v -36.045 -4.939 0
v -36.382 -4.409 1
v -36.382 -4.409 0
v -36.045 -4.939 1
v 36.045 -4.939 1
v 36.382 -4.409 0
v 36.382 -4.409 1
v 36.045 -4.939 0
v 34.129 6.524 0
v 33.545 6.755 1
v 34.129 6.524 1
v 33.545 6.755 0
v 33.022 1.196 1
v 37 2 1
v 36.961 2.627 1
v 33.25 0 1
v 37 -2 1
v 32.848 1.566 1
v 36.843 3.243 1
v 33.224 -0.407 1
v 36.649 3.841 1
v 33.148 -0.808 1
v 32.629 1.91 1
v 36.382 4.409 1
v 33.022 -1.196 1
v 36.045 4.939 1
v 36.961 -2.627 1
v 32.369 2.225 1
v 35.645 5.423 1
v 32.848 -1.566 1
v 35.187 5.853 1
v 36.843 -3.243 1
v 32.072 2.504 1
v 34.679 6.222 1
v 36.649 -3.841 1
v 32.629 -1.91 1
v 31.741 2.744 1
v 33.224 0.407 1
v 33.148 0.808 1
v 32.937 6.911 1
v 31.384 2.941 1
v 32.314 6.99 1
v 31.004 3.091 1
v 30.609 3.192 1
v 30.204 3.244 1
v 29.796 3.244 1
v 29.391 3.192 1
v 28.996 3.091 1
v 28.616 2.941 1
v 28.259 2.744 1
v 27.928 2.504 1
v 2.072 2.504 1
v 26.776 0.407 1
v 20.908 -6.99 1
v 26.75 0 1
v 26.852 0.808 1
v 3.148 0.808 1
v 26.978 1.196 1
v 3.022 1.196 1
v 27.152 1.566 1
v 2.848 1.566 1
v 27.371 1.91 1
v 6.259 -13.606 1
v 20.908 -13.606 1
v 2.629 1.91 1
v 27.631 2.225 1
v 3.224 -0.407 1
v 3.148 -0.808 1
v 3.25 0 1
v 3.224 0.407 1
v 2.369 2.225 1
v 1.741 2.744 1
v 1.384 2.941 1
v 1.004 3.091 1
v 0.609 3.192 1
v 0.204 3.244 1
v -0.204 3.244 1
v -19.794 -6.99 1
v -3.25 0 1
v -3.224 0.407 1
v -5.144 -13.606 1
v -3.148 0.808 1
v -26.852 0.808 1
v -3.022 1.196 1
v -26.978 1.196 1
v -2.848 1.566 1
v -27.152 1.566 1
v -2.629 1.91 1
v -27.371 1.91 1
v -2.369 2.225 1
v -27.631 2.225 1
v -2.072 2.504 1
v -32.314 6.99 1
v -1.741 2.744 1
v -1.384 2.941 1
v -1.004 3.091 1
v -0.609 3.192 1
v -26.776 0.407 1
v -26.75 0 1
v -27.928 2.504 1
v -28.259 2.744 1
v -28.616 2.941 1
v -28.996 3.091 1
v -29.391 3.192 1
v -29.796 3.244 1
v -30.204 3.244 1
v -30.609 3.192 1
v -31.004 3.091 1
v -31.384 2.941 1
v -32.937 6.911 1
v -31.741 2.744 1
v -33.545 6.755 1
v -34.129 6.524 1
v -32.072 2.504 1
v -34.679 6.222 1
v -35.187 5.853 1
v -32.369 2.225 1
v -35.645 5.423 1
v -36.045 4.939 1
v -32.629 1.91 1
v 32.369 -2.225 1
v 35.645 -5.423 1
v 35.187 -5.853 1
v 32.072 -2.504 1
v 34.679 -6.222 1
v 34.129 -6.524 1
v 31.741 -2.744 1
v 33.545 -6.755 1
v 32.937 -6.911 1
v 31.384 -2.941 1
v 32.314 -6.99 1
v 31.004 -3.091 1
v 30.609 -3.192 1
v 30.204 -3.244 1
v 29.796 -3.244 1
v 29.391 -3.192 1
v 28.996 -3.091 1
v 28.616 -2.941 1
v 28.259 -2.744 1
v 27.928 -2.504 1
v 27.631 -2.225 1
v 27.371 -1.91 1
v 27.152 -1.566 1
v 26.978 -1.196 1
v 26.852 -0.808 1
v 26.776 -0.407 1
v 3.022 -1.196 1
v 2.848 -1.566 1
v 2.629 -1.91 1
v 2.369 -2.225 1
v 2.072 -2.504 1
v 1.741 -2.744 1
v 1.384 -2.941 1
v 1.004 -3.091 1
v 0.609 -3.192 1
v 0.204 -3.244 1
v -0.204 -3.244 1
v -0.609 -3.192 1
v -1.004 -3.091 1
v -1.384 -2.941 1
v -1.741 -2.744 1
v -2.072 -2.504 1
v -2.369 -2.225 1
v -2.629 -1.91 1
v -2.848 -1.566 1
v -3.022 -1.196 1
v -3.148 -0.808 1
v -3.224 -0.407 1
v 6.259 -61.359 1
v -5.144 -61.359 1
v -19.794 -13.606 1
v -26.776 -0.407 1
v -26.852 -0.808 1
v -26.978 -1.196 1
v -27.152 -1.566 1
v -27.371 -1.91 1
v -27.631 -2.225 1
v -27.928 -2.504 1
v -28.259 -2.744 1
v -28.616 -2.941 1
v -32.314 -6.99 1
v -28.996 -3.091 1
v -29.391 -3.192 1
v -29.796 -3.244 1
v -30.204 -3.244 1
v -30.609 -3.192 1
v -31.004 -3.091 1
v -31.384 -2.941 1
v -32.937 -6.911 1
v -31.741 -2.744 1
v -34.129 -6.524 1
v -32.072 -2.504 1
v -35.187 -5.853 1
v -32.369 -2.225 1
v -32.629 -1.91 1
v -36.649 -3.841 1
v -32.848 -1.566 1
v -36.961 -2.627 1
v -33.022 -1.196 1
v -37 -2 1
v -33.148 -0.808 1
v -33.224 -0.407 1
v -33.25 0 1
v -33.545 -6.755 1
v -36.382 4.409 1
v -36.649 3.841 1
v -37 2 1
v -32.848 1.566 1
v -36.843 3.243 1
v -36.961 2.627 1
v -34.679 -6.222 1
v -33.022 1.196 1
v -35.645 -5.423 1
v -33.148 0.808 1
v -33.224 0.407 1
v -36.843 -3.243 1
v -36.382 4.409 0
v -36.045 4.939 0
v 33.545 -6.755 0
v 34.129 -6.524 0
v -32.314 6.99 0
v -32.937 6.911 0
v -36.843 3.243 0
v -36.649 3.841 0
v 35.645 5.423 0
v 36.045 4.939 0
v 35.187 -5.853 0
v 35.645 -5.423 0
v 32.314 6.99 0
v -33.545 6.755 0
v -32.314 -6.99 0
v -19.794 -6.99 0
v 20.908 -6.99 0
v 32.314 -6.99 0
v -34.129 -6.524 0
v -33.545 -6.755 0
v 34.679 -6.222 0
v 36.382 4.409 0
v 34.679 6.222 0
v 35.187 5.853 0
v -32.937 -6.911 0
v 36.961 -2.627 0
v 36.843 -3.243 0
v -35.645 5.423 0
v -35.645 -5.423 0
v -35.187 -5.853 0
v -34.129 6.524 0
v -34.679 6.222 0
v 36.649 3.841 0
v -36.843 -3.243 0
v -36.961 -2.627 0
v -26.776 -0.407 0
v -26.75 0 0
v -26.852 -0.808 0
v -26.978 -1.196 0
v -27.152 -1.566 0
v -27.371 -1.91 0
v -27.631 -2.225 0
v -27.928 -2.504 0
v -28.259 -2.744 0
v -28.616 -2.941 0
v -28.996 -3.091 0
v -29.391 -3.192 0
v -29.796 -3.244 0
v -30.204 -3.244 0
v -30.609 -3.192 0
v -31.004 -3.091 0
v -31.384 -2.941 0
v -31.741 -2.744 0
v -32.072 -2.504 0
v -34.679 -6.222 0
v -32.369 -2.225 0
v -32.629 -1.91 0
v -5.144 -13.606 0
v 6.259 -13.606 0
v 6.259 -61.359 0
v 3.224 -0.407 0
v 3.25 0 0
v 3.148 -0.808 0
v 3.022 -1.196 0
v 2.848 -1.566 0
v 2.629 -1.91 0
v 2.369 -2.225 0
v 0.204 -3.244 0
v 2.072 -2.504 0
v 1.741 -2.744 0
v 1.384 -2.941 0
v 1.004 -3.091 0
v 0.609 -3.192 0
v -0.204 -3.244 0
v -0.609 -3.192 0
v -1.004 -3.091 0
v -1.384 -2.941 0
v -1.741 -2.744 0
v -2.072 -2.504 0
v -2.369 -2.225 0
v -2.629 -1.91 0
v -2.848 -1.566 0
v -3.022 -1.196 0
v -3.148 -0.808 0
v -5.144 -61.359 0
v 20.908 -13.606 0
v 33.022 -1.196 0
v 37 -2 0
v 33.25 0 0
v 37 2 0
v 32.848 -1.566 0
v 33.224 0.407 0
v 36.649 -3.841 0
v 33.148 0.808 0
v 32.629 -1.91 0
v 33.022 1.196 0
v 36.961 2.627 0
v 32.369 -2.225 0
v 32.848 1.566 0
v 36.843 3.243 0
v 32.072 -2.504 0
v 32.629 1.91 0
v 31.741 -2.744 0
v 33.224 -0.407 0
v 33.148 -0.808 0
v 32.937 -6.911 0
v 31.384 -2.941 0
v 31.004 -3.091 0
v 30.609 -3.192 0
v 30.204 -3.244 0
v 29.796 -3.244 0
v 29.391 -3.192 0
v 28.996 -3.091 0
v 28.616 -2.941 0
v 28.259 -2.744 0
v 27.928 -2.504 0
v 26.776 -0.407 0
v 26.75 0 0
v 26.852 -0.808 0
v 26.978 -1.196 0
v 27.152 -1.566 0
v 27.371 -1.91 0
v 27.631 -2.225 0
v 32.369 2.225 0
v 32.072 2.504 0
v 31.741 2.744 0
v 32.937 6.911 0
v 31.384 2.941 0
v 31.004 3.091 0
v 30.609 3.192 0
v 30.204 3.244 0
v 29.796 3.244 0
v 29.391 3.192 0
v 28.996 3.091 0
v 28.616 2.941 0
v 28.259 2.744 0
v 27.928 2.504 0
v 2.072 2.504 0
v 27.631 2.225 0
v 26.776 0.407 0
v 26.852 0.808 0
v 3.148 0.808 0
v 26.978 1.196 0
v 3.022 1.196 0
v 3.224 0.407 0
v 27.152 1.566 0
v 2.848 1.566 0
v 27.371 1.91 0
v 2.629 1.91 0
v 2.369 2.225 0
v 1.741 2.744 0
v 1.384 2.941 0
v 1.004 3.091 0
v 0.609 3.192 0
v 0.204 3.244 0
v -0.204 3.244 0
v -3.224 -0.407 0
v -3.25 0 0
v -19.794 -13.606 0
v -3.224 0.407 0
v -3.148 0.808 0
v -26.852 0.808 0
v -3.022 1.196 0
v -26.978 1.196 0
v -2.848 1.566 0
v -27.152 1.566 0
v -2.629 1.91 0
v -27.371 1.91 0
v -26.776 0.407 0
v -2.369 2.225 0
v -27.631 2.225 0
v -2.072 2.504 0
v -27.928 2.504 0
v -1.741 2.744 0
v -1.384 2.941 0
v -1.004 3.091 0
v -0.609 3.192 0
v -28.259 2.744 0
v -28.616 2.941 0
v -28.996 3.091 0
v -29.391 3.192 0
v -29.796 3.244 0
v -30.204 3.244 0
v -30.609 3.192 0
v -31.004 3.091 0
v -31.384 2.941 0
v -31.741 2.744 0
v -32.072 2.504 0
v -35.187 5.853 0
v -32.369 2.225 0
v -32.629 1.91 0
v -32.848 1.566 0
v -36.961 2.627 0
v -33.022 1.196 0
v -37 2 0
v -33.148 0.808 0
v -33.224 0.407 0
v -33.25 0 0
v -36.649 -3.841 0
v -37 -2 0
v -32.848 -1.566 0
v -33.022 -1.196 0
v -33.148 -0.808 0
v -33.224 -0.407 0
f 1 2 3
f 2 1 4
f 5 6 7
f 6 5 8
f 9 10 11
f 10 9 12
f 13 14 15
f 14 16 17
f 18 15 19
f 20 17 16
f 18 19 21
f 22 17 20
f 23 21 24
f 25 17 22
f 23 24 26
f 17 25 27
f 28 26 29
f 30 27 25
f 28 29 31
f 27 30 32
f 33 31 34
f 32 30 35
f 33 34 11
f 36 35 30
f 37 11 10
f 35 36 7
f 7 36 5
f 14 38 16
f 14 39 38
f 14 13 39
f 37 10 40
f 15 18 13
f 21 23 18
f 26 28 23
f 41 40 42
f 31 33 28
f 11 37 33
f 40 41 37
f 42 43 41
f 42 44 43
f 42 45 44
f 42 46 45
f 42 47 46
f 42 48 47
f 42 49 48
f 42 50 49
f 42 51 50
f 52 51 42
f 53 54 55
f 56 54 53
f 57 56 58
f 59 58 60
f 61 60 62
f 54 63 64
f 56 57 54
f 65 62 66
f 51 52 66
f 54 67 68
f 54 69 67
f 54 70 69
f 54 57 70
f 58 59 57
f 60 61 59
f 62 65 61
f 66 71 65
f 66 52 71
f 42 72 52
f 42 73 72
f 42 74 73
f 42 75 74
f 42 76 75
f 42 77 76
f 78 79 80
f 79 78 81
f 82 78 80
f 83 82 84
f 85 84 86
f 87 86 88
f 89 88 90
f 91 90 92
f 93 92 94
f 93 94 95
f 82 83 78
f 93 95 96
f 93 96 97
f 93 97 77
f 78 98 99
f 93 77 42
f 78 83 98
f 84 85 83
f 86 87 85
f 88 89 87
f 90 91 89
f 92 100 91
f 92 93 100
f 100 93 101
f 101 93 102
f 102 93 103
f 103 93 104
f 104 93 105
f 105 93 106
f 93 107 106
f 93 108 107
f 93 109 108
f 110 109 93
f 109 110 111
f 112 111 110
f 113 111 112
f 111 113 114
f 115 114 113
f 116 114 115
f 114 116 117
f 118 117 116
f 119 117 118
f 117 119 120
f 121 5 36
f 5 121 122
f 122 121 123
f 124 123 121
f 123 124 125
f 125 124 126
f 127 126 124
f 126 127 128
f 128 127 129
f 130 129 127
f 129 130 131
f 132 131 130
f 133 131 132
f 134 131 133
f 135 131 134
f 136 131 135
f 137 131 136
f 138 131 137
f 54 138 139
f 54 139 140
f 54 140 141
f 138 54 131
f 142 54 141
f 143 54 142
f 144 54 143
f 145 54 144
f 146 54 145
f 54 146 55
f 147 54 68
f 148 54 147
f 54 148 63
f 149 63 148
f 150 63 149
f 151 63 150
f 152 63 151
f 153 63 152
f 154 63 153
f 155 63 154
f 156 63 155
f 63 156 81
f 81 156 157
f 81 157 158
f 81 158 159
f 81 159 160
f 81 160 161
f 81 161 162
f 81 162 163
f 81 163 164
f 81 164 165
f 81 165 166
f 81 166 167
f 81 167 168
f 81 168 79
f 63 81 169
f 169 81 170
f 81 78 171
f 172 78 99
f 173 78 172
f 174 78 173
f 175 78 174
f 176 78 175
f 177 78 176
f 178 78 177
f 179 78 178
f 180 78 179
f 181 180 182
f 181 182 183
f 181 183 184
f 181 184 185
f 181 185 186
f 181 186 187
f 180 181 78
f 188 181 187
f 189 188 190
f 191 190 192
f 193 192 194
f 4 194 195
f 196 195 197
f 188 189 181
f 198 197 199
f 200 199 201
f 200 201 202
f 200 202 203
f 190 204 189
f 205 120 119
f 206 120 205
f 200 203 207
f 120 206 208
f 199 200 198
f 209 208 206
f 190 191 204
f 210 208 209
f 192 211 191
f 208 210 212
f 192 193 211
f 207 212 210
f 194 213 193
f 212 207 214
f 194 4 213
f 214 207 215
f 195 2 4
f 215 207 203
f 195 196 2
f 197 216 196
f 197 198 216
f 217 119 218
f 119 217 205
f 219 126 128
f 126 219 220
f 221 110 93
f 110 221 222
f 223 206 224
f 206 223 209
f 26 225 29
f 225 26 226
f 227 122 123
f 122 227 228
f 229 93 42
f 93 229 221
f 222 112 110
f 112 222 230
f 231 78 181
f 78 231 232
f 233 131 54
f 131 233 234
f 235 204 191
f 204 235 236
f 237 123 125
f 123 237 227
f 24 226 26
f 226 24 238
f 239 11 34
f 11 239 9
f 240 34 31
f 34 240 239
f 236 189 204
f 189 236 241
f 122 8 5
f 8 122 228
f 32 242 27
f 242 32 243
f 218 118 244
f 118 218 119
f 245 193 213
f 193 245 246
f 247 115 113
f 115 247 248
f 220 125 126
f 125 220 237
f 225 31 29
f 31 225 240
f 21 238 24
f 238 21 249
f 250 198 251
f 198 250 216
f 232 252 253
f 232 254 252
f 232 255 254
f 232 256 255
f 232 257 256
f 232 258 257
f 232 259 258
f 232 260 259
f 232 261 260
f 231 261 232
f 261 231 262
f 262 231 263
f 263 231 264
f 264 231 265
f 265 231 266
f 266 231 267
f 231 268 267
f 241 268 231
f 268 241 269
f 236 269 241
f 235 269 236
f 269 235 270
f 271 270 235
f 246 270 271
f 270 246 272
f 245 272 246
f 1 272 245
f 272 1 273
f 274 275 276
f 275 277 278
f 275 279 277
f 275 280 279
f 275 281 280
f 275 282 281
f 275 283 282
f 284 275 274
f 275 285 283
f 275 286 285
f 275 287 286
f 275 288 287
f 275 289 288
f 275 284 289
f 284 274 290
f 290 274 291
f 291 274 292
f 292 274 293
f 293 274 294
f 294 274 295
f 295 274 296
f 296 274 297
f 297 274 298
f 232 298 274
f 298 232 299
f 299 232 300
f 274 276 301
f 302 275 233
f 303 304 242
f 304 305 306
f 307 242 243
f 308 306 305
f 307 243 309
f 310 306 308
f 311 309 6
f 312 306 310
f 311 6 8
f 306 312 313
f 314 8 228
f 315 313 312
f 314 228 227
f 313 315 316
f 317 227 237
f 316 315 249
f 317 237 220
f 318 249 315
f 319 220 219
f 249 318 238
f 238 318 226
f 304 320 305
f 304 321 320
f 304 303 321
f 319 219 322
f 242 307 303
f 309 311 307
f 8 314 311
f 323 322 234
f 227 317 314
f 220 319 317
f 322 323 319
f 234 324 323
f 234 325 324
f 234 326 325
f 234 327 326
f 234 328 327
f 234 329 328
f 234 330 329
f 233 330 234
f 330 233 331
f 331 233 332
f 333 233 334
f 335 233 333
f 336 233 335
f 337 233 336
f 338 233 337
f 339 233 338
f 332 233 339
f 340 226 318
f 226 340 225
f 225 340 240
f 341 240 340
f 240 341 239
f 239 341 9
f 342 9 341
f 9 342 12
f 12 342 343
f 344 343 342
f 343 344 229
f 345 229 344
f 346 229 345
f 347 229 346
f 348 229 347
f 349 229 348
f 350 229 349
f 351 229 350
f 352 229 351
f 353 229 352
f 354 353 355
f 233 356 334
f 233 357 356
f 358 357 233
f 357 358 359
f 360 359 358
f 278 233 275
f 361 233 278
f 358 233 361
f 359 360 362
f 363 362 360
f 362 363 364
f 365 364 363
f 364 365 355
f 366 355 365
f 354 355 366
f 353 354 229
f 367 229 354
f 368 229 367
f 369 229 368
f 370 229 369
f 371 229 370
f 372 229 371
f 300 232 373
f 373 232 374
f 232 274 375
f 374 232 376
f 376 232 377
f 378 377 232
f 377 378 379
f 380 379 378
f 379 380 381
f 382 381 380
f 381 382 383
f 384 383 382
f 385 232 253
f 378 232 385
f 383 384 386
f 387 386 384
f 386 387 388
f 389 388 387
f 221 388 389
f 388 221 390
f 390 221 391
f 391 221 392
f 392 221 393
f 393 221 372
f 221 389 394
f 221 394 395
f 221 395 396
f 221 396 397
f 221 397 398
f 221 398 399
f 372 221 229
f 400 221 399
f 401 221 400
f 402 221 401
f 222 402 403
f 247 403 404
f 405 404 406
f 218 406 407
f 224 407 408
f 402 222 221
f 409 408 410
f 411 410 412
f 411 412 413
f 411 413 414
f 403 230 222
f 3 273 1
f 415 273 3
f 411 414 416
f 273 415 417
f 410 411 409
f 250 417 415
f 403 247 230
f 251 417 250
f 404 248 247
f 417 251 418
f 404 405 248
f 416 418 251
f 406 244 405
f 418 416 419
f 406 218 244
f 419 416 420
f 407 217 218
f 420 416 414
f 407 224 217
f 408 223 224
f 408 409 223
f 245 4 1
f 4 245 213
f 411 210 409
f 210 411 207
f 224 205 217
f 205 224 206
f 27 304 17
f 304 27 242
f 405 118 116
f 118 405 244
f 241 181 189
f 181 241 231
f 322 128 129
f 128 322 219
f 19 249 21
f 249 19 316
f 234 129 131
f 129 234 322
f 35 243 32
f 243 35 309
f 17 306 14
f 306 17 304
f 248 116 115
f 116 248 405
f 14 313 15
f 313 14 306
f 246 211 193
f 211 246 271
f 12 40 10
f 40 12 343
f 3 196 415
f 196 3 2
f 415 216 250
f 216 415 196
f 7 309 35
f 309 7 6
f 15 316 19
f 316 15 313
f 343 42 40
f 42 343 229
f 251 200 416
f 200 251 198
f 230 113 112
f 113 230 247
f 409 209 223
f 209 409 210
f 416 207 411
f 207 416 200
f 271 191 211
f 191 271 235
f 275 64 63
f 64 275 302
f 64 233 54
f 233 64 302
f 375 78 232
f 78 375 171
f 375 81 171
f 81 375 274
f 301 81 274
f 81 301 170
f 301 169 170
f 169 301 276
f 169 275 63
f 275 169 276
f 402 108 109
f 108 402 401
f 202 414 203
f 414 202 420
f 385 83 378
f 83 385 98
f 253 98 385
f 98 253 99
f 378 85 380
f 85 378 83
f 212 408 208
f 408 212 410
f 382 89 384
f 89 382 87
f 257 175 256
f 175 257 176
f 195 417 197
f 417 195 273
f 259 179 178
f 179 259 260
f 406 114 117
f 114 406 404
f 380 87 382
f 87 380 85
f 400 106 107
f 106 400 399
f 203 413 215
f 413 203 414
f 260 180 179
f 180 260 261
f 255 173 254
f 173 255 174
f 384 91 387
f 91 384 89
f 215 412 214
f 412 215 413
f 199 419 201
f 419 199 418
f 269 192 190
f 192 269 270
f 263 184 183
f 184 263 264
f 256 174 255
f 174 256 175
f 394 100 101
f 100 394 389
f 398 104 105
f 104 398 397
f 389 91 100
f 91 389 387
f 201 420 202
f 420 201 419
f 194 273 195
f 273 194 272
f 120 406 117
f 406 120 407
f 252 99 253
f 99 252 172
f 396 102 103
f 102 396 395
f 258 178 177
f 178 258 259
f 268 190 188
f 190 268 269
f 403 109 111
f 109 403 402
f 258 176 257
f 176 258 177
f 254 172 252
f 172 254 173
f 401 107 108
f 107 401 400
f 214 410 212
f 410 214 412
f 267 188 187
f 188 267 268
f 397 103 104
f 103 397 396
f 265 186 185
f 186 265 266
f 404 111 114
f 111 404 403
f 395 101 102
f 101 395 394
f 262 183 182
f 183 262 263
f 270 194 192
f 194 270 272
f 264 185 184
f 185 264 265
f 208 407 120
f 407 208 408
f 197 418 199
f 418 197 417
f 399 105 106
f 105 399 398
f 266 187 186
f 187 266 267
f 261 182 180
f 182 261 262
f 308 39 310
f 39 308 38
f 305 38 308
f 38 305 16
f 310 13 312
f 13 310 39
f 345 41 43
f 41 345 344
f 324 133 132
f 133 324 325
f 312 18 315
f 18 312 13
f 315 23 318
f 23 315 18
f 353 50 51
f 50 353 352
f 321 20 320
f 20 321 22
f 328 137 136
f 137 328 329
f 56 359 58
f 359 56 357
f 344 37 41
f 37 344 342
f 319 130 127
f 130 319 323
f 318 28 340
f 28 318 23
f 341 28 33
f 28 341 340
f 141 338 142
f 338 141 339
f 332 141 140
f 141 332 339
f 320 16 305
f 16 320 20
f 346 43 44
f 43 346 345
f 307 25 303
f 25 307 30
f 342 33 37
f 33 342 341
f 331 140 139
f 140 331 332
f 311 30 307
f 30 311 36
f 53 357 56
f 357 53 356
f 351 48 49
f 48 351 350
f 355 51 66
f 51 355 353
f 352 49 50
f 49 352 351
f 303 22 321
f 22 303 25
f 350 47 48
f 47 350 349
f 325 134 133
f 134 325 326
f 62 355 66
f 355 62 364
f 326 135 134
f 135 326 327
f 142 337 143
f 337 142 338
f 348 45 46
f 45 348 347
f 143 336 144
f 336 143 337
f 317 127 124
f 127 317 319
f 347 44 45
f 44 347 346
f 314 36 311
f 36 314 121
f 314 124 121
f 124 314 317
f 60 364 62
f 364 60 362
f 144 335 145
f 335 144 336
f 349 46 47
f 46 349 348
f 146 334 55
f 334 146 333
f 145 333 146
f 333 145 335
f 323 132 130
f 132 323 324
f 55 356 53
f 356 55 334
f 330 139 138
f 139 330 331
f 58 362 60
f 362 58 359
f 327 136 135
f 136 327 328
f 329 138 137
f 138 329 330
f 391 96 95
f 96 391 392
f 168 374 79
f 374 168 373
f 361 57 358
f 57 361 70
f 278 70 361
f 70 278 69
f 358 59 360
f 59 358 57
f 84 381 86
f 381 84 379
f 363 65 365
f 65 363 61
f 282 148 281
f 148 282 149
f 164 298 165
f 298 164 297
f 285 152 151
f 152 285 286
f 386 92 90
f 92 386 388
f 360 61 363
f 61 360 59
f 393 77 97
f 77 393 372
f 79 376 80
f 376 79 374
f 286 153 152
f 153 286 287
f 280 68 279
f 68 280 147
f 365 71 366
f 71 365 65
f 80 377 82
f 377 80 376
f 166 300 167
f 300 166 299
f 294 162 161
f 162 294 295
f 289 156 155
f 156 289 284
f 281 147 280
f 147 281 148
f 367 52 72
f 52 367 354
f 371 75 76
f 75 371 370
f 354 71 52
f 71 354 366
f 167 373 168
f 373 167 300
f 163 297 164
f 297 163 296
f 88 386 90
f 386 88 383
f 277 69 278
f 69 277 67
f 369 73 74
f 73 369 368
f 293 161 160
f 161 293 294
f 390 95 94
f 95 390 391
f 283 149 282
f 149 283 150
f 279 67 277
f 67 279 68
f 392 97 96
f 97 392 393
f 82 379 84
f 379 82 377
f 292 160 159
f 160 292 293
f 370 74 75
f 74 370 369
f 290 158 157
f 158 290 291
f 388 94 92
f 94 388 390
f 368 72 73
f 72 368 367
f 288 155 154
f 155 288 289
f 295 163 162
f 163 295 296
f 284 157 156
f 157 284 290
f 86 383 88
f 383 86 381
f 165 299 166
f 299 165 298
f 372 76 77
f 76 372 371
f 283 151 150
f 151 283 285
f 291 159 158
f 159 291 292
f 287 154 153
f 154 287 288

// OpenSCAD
$fn = 50;


difference() {
	union() {
		translate(v = [0, 0, 0]) {
			rotate(a = [0, 0, 0]) {
				hull() {
					translate(v = [-32.0000000000, 2.0000000000, 0]) {
						rotate(a = [0, 0, 0]) {
							translate(v = [0, 0, 0]) {
								rotate(a = [0, 0, 0]) {
									cylinder(h = 1, r = 5);
								}
							}
						}
					}
					translate(v = [32.0000000000, 2.0000000000, 0]) {
						rotate(a = [0, 0, 0]) {
							translate(v = [0, 0, 0]) {
								rotate(a = [0, 0, 0]) {
									cylinder(h = 1, r = 5);
								}
							}
						}
					}
					translate(v = [-32.0000000000, -2.0000000000, 0]) {
						rotate(a = [0, 0, 0]) {
							translate(v = [0, 0, 0]) {
								rotate(a = [0, 0, 0]) {
									cylinder(h = 1, r = 5);
								}
							}
						}
					}
					translate(v = [32.0000000000, -2.0000000000, 0]) {
						rotate(a = [0, 0, 0]) {
							translate(v = [0, 0, 0]) {
								rotate(a = [0, 0, 0]) {
									cylinder(h = 1, r = 5);
								}
							}
						}
					}
				}
			}
		}
		translate(v = [0, -5, 0]) {
			rotate(a = [0, 0, 0]) {
				linear_extrude(height = 1) {
					text(font = "DejaVu Sans Mono:style=Bold", halign = "center", size = 57.0000000000, text = "T", valign = "top");
				}
			}
		}
	}
	union() {
		translate(v = [-30.0000000000, 0.0000000000, -125.0000000000]) {
			rotate(a = [0, 0, 0]) {
				cylinder(h = 250, r = 3.2500000000);
			}
		}
		translate(v = [30.0000000000, 0.0000000000, -125.0000000000]) {
			rotate(a = [0, 0, 0]) {
				cylinder(h = 250, r = 3.2500000000);
			}
		}
		translate(v = [30.0000000000, 0.0000000000, -125.0000000000]) {
			rotate(a = [0, 0, 0]) {
				cylinder(h = 250, r = 3.2500000000);
			}
		}
		translate(v = [0, 0, -125.0000000000]) {
			rotate(a = [0, 0, 0]) {
				cylinder(h = 250, r = 3.2500000000);
			}
		}
	}
}
